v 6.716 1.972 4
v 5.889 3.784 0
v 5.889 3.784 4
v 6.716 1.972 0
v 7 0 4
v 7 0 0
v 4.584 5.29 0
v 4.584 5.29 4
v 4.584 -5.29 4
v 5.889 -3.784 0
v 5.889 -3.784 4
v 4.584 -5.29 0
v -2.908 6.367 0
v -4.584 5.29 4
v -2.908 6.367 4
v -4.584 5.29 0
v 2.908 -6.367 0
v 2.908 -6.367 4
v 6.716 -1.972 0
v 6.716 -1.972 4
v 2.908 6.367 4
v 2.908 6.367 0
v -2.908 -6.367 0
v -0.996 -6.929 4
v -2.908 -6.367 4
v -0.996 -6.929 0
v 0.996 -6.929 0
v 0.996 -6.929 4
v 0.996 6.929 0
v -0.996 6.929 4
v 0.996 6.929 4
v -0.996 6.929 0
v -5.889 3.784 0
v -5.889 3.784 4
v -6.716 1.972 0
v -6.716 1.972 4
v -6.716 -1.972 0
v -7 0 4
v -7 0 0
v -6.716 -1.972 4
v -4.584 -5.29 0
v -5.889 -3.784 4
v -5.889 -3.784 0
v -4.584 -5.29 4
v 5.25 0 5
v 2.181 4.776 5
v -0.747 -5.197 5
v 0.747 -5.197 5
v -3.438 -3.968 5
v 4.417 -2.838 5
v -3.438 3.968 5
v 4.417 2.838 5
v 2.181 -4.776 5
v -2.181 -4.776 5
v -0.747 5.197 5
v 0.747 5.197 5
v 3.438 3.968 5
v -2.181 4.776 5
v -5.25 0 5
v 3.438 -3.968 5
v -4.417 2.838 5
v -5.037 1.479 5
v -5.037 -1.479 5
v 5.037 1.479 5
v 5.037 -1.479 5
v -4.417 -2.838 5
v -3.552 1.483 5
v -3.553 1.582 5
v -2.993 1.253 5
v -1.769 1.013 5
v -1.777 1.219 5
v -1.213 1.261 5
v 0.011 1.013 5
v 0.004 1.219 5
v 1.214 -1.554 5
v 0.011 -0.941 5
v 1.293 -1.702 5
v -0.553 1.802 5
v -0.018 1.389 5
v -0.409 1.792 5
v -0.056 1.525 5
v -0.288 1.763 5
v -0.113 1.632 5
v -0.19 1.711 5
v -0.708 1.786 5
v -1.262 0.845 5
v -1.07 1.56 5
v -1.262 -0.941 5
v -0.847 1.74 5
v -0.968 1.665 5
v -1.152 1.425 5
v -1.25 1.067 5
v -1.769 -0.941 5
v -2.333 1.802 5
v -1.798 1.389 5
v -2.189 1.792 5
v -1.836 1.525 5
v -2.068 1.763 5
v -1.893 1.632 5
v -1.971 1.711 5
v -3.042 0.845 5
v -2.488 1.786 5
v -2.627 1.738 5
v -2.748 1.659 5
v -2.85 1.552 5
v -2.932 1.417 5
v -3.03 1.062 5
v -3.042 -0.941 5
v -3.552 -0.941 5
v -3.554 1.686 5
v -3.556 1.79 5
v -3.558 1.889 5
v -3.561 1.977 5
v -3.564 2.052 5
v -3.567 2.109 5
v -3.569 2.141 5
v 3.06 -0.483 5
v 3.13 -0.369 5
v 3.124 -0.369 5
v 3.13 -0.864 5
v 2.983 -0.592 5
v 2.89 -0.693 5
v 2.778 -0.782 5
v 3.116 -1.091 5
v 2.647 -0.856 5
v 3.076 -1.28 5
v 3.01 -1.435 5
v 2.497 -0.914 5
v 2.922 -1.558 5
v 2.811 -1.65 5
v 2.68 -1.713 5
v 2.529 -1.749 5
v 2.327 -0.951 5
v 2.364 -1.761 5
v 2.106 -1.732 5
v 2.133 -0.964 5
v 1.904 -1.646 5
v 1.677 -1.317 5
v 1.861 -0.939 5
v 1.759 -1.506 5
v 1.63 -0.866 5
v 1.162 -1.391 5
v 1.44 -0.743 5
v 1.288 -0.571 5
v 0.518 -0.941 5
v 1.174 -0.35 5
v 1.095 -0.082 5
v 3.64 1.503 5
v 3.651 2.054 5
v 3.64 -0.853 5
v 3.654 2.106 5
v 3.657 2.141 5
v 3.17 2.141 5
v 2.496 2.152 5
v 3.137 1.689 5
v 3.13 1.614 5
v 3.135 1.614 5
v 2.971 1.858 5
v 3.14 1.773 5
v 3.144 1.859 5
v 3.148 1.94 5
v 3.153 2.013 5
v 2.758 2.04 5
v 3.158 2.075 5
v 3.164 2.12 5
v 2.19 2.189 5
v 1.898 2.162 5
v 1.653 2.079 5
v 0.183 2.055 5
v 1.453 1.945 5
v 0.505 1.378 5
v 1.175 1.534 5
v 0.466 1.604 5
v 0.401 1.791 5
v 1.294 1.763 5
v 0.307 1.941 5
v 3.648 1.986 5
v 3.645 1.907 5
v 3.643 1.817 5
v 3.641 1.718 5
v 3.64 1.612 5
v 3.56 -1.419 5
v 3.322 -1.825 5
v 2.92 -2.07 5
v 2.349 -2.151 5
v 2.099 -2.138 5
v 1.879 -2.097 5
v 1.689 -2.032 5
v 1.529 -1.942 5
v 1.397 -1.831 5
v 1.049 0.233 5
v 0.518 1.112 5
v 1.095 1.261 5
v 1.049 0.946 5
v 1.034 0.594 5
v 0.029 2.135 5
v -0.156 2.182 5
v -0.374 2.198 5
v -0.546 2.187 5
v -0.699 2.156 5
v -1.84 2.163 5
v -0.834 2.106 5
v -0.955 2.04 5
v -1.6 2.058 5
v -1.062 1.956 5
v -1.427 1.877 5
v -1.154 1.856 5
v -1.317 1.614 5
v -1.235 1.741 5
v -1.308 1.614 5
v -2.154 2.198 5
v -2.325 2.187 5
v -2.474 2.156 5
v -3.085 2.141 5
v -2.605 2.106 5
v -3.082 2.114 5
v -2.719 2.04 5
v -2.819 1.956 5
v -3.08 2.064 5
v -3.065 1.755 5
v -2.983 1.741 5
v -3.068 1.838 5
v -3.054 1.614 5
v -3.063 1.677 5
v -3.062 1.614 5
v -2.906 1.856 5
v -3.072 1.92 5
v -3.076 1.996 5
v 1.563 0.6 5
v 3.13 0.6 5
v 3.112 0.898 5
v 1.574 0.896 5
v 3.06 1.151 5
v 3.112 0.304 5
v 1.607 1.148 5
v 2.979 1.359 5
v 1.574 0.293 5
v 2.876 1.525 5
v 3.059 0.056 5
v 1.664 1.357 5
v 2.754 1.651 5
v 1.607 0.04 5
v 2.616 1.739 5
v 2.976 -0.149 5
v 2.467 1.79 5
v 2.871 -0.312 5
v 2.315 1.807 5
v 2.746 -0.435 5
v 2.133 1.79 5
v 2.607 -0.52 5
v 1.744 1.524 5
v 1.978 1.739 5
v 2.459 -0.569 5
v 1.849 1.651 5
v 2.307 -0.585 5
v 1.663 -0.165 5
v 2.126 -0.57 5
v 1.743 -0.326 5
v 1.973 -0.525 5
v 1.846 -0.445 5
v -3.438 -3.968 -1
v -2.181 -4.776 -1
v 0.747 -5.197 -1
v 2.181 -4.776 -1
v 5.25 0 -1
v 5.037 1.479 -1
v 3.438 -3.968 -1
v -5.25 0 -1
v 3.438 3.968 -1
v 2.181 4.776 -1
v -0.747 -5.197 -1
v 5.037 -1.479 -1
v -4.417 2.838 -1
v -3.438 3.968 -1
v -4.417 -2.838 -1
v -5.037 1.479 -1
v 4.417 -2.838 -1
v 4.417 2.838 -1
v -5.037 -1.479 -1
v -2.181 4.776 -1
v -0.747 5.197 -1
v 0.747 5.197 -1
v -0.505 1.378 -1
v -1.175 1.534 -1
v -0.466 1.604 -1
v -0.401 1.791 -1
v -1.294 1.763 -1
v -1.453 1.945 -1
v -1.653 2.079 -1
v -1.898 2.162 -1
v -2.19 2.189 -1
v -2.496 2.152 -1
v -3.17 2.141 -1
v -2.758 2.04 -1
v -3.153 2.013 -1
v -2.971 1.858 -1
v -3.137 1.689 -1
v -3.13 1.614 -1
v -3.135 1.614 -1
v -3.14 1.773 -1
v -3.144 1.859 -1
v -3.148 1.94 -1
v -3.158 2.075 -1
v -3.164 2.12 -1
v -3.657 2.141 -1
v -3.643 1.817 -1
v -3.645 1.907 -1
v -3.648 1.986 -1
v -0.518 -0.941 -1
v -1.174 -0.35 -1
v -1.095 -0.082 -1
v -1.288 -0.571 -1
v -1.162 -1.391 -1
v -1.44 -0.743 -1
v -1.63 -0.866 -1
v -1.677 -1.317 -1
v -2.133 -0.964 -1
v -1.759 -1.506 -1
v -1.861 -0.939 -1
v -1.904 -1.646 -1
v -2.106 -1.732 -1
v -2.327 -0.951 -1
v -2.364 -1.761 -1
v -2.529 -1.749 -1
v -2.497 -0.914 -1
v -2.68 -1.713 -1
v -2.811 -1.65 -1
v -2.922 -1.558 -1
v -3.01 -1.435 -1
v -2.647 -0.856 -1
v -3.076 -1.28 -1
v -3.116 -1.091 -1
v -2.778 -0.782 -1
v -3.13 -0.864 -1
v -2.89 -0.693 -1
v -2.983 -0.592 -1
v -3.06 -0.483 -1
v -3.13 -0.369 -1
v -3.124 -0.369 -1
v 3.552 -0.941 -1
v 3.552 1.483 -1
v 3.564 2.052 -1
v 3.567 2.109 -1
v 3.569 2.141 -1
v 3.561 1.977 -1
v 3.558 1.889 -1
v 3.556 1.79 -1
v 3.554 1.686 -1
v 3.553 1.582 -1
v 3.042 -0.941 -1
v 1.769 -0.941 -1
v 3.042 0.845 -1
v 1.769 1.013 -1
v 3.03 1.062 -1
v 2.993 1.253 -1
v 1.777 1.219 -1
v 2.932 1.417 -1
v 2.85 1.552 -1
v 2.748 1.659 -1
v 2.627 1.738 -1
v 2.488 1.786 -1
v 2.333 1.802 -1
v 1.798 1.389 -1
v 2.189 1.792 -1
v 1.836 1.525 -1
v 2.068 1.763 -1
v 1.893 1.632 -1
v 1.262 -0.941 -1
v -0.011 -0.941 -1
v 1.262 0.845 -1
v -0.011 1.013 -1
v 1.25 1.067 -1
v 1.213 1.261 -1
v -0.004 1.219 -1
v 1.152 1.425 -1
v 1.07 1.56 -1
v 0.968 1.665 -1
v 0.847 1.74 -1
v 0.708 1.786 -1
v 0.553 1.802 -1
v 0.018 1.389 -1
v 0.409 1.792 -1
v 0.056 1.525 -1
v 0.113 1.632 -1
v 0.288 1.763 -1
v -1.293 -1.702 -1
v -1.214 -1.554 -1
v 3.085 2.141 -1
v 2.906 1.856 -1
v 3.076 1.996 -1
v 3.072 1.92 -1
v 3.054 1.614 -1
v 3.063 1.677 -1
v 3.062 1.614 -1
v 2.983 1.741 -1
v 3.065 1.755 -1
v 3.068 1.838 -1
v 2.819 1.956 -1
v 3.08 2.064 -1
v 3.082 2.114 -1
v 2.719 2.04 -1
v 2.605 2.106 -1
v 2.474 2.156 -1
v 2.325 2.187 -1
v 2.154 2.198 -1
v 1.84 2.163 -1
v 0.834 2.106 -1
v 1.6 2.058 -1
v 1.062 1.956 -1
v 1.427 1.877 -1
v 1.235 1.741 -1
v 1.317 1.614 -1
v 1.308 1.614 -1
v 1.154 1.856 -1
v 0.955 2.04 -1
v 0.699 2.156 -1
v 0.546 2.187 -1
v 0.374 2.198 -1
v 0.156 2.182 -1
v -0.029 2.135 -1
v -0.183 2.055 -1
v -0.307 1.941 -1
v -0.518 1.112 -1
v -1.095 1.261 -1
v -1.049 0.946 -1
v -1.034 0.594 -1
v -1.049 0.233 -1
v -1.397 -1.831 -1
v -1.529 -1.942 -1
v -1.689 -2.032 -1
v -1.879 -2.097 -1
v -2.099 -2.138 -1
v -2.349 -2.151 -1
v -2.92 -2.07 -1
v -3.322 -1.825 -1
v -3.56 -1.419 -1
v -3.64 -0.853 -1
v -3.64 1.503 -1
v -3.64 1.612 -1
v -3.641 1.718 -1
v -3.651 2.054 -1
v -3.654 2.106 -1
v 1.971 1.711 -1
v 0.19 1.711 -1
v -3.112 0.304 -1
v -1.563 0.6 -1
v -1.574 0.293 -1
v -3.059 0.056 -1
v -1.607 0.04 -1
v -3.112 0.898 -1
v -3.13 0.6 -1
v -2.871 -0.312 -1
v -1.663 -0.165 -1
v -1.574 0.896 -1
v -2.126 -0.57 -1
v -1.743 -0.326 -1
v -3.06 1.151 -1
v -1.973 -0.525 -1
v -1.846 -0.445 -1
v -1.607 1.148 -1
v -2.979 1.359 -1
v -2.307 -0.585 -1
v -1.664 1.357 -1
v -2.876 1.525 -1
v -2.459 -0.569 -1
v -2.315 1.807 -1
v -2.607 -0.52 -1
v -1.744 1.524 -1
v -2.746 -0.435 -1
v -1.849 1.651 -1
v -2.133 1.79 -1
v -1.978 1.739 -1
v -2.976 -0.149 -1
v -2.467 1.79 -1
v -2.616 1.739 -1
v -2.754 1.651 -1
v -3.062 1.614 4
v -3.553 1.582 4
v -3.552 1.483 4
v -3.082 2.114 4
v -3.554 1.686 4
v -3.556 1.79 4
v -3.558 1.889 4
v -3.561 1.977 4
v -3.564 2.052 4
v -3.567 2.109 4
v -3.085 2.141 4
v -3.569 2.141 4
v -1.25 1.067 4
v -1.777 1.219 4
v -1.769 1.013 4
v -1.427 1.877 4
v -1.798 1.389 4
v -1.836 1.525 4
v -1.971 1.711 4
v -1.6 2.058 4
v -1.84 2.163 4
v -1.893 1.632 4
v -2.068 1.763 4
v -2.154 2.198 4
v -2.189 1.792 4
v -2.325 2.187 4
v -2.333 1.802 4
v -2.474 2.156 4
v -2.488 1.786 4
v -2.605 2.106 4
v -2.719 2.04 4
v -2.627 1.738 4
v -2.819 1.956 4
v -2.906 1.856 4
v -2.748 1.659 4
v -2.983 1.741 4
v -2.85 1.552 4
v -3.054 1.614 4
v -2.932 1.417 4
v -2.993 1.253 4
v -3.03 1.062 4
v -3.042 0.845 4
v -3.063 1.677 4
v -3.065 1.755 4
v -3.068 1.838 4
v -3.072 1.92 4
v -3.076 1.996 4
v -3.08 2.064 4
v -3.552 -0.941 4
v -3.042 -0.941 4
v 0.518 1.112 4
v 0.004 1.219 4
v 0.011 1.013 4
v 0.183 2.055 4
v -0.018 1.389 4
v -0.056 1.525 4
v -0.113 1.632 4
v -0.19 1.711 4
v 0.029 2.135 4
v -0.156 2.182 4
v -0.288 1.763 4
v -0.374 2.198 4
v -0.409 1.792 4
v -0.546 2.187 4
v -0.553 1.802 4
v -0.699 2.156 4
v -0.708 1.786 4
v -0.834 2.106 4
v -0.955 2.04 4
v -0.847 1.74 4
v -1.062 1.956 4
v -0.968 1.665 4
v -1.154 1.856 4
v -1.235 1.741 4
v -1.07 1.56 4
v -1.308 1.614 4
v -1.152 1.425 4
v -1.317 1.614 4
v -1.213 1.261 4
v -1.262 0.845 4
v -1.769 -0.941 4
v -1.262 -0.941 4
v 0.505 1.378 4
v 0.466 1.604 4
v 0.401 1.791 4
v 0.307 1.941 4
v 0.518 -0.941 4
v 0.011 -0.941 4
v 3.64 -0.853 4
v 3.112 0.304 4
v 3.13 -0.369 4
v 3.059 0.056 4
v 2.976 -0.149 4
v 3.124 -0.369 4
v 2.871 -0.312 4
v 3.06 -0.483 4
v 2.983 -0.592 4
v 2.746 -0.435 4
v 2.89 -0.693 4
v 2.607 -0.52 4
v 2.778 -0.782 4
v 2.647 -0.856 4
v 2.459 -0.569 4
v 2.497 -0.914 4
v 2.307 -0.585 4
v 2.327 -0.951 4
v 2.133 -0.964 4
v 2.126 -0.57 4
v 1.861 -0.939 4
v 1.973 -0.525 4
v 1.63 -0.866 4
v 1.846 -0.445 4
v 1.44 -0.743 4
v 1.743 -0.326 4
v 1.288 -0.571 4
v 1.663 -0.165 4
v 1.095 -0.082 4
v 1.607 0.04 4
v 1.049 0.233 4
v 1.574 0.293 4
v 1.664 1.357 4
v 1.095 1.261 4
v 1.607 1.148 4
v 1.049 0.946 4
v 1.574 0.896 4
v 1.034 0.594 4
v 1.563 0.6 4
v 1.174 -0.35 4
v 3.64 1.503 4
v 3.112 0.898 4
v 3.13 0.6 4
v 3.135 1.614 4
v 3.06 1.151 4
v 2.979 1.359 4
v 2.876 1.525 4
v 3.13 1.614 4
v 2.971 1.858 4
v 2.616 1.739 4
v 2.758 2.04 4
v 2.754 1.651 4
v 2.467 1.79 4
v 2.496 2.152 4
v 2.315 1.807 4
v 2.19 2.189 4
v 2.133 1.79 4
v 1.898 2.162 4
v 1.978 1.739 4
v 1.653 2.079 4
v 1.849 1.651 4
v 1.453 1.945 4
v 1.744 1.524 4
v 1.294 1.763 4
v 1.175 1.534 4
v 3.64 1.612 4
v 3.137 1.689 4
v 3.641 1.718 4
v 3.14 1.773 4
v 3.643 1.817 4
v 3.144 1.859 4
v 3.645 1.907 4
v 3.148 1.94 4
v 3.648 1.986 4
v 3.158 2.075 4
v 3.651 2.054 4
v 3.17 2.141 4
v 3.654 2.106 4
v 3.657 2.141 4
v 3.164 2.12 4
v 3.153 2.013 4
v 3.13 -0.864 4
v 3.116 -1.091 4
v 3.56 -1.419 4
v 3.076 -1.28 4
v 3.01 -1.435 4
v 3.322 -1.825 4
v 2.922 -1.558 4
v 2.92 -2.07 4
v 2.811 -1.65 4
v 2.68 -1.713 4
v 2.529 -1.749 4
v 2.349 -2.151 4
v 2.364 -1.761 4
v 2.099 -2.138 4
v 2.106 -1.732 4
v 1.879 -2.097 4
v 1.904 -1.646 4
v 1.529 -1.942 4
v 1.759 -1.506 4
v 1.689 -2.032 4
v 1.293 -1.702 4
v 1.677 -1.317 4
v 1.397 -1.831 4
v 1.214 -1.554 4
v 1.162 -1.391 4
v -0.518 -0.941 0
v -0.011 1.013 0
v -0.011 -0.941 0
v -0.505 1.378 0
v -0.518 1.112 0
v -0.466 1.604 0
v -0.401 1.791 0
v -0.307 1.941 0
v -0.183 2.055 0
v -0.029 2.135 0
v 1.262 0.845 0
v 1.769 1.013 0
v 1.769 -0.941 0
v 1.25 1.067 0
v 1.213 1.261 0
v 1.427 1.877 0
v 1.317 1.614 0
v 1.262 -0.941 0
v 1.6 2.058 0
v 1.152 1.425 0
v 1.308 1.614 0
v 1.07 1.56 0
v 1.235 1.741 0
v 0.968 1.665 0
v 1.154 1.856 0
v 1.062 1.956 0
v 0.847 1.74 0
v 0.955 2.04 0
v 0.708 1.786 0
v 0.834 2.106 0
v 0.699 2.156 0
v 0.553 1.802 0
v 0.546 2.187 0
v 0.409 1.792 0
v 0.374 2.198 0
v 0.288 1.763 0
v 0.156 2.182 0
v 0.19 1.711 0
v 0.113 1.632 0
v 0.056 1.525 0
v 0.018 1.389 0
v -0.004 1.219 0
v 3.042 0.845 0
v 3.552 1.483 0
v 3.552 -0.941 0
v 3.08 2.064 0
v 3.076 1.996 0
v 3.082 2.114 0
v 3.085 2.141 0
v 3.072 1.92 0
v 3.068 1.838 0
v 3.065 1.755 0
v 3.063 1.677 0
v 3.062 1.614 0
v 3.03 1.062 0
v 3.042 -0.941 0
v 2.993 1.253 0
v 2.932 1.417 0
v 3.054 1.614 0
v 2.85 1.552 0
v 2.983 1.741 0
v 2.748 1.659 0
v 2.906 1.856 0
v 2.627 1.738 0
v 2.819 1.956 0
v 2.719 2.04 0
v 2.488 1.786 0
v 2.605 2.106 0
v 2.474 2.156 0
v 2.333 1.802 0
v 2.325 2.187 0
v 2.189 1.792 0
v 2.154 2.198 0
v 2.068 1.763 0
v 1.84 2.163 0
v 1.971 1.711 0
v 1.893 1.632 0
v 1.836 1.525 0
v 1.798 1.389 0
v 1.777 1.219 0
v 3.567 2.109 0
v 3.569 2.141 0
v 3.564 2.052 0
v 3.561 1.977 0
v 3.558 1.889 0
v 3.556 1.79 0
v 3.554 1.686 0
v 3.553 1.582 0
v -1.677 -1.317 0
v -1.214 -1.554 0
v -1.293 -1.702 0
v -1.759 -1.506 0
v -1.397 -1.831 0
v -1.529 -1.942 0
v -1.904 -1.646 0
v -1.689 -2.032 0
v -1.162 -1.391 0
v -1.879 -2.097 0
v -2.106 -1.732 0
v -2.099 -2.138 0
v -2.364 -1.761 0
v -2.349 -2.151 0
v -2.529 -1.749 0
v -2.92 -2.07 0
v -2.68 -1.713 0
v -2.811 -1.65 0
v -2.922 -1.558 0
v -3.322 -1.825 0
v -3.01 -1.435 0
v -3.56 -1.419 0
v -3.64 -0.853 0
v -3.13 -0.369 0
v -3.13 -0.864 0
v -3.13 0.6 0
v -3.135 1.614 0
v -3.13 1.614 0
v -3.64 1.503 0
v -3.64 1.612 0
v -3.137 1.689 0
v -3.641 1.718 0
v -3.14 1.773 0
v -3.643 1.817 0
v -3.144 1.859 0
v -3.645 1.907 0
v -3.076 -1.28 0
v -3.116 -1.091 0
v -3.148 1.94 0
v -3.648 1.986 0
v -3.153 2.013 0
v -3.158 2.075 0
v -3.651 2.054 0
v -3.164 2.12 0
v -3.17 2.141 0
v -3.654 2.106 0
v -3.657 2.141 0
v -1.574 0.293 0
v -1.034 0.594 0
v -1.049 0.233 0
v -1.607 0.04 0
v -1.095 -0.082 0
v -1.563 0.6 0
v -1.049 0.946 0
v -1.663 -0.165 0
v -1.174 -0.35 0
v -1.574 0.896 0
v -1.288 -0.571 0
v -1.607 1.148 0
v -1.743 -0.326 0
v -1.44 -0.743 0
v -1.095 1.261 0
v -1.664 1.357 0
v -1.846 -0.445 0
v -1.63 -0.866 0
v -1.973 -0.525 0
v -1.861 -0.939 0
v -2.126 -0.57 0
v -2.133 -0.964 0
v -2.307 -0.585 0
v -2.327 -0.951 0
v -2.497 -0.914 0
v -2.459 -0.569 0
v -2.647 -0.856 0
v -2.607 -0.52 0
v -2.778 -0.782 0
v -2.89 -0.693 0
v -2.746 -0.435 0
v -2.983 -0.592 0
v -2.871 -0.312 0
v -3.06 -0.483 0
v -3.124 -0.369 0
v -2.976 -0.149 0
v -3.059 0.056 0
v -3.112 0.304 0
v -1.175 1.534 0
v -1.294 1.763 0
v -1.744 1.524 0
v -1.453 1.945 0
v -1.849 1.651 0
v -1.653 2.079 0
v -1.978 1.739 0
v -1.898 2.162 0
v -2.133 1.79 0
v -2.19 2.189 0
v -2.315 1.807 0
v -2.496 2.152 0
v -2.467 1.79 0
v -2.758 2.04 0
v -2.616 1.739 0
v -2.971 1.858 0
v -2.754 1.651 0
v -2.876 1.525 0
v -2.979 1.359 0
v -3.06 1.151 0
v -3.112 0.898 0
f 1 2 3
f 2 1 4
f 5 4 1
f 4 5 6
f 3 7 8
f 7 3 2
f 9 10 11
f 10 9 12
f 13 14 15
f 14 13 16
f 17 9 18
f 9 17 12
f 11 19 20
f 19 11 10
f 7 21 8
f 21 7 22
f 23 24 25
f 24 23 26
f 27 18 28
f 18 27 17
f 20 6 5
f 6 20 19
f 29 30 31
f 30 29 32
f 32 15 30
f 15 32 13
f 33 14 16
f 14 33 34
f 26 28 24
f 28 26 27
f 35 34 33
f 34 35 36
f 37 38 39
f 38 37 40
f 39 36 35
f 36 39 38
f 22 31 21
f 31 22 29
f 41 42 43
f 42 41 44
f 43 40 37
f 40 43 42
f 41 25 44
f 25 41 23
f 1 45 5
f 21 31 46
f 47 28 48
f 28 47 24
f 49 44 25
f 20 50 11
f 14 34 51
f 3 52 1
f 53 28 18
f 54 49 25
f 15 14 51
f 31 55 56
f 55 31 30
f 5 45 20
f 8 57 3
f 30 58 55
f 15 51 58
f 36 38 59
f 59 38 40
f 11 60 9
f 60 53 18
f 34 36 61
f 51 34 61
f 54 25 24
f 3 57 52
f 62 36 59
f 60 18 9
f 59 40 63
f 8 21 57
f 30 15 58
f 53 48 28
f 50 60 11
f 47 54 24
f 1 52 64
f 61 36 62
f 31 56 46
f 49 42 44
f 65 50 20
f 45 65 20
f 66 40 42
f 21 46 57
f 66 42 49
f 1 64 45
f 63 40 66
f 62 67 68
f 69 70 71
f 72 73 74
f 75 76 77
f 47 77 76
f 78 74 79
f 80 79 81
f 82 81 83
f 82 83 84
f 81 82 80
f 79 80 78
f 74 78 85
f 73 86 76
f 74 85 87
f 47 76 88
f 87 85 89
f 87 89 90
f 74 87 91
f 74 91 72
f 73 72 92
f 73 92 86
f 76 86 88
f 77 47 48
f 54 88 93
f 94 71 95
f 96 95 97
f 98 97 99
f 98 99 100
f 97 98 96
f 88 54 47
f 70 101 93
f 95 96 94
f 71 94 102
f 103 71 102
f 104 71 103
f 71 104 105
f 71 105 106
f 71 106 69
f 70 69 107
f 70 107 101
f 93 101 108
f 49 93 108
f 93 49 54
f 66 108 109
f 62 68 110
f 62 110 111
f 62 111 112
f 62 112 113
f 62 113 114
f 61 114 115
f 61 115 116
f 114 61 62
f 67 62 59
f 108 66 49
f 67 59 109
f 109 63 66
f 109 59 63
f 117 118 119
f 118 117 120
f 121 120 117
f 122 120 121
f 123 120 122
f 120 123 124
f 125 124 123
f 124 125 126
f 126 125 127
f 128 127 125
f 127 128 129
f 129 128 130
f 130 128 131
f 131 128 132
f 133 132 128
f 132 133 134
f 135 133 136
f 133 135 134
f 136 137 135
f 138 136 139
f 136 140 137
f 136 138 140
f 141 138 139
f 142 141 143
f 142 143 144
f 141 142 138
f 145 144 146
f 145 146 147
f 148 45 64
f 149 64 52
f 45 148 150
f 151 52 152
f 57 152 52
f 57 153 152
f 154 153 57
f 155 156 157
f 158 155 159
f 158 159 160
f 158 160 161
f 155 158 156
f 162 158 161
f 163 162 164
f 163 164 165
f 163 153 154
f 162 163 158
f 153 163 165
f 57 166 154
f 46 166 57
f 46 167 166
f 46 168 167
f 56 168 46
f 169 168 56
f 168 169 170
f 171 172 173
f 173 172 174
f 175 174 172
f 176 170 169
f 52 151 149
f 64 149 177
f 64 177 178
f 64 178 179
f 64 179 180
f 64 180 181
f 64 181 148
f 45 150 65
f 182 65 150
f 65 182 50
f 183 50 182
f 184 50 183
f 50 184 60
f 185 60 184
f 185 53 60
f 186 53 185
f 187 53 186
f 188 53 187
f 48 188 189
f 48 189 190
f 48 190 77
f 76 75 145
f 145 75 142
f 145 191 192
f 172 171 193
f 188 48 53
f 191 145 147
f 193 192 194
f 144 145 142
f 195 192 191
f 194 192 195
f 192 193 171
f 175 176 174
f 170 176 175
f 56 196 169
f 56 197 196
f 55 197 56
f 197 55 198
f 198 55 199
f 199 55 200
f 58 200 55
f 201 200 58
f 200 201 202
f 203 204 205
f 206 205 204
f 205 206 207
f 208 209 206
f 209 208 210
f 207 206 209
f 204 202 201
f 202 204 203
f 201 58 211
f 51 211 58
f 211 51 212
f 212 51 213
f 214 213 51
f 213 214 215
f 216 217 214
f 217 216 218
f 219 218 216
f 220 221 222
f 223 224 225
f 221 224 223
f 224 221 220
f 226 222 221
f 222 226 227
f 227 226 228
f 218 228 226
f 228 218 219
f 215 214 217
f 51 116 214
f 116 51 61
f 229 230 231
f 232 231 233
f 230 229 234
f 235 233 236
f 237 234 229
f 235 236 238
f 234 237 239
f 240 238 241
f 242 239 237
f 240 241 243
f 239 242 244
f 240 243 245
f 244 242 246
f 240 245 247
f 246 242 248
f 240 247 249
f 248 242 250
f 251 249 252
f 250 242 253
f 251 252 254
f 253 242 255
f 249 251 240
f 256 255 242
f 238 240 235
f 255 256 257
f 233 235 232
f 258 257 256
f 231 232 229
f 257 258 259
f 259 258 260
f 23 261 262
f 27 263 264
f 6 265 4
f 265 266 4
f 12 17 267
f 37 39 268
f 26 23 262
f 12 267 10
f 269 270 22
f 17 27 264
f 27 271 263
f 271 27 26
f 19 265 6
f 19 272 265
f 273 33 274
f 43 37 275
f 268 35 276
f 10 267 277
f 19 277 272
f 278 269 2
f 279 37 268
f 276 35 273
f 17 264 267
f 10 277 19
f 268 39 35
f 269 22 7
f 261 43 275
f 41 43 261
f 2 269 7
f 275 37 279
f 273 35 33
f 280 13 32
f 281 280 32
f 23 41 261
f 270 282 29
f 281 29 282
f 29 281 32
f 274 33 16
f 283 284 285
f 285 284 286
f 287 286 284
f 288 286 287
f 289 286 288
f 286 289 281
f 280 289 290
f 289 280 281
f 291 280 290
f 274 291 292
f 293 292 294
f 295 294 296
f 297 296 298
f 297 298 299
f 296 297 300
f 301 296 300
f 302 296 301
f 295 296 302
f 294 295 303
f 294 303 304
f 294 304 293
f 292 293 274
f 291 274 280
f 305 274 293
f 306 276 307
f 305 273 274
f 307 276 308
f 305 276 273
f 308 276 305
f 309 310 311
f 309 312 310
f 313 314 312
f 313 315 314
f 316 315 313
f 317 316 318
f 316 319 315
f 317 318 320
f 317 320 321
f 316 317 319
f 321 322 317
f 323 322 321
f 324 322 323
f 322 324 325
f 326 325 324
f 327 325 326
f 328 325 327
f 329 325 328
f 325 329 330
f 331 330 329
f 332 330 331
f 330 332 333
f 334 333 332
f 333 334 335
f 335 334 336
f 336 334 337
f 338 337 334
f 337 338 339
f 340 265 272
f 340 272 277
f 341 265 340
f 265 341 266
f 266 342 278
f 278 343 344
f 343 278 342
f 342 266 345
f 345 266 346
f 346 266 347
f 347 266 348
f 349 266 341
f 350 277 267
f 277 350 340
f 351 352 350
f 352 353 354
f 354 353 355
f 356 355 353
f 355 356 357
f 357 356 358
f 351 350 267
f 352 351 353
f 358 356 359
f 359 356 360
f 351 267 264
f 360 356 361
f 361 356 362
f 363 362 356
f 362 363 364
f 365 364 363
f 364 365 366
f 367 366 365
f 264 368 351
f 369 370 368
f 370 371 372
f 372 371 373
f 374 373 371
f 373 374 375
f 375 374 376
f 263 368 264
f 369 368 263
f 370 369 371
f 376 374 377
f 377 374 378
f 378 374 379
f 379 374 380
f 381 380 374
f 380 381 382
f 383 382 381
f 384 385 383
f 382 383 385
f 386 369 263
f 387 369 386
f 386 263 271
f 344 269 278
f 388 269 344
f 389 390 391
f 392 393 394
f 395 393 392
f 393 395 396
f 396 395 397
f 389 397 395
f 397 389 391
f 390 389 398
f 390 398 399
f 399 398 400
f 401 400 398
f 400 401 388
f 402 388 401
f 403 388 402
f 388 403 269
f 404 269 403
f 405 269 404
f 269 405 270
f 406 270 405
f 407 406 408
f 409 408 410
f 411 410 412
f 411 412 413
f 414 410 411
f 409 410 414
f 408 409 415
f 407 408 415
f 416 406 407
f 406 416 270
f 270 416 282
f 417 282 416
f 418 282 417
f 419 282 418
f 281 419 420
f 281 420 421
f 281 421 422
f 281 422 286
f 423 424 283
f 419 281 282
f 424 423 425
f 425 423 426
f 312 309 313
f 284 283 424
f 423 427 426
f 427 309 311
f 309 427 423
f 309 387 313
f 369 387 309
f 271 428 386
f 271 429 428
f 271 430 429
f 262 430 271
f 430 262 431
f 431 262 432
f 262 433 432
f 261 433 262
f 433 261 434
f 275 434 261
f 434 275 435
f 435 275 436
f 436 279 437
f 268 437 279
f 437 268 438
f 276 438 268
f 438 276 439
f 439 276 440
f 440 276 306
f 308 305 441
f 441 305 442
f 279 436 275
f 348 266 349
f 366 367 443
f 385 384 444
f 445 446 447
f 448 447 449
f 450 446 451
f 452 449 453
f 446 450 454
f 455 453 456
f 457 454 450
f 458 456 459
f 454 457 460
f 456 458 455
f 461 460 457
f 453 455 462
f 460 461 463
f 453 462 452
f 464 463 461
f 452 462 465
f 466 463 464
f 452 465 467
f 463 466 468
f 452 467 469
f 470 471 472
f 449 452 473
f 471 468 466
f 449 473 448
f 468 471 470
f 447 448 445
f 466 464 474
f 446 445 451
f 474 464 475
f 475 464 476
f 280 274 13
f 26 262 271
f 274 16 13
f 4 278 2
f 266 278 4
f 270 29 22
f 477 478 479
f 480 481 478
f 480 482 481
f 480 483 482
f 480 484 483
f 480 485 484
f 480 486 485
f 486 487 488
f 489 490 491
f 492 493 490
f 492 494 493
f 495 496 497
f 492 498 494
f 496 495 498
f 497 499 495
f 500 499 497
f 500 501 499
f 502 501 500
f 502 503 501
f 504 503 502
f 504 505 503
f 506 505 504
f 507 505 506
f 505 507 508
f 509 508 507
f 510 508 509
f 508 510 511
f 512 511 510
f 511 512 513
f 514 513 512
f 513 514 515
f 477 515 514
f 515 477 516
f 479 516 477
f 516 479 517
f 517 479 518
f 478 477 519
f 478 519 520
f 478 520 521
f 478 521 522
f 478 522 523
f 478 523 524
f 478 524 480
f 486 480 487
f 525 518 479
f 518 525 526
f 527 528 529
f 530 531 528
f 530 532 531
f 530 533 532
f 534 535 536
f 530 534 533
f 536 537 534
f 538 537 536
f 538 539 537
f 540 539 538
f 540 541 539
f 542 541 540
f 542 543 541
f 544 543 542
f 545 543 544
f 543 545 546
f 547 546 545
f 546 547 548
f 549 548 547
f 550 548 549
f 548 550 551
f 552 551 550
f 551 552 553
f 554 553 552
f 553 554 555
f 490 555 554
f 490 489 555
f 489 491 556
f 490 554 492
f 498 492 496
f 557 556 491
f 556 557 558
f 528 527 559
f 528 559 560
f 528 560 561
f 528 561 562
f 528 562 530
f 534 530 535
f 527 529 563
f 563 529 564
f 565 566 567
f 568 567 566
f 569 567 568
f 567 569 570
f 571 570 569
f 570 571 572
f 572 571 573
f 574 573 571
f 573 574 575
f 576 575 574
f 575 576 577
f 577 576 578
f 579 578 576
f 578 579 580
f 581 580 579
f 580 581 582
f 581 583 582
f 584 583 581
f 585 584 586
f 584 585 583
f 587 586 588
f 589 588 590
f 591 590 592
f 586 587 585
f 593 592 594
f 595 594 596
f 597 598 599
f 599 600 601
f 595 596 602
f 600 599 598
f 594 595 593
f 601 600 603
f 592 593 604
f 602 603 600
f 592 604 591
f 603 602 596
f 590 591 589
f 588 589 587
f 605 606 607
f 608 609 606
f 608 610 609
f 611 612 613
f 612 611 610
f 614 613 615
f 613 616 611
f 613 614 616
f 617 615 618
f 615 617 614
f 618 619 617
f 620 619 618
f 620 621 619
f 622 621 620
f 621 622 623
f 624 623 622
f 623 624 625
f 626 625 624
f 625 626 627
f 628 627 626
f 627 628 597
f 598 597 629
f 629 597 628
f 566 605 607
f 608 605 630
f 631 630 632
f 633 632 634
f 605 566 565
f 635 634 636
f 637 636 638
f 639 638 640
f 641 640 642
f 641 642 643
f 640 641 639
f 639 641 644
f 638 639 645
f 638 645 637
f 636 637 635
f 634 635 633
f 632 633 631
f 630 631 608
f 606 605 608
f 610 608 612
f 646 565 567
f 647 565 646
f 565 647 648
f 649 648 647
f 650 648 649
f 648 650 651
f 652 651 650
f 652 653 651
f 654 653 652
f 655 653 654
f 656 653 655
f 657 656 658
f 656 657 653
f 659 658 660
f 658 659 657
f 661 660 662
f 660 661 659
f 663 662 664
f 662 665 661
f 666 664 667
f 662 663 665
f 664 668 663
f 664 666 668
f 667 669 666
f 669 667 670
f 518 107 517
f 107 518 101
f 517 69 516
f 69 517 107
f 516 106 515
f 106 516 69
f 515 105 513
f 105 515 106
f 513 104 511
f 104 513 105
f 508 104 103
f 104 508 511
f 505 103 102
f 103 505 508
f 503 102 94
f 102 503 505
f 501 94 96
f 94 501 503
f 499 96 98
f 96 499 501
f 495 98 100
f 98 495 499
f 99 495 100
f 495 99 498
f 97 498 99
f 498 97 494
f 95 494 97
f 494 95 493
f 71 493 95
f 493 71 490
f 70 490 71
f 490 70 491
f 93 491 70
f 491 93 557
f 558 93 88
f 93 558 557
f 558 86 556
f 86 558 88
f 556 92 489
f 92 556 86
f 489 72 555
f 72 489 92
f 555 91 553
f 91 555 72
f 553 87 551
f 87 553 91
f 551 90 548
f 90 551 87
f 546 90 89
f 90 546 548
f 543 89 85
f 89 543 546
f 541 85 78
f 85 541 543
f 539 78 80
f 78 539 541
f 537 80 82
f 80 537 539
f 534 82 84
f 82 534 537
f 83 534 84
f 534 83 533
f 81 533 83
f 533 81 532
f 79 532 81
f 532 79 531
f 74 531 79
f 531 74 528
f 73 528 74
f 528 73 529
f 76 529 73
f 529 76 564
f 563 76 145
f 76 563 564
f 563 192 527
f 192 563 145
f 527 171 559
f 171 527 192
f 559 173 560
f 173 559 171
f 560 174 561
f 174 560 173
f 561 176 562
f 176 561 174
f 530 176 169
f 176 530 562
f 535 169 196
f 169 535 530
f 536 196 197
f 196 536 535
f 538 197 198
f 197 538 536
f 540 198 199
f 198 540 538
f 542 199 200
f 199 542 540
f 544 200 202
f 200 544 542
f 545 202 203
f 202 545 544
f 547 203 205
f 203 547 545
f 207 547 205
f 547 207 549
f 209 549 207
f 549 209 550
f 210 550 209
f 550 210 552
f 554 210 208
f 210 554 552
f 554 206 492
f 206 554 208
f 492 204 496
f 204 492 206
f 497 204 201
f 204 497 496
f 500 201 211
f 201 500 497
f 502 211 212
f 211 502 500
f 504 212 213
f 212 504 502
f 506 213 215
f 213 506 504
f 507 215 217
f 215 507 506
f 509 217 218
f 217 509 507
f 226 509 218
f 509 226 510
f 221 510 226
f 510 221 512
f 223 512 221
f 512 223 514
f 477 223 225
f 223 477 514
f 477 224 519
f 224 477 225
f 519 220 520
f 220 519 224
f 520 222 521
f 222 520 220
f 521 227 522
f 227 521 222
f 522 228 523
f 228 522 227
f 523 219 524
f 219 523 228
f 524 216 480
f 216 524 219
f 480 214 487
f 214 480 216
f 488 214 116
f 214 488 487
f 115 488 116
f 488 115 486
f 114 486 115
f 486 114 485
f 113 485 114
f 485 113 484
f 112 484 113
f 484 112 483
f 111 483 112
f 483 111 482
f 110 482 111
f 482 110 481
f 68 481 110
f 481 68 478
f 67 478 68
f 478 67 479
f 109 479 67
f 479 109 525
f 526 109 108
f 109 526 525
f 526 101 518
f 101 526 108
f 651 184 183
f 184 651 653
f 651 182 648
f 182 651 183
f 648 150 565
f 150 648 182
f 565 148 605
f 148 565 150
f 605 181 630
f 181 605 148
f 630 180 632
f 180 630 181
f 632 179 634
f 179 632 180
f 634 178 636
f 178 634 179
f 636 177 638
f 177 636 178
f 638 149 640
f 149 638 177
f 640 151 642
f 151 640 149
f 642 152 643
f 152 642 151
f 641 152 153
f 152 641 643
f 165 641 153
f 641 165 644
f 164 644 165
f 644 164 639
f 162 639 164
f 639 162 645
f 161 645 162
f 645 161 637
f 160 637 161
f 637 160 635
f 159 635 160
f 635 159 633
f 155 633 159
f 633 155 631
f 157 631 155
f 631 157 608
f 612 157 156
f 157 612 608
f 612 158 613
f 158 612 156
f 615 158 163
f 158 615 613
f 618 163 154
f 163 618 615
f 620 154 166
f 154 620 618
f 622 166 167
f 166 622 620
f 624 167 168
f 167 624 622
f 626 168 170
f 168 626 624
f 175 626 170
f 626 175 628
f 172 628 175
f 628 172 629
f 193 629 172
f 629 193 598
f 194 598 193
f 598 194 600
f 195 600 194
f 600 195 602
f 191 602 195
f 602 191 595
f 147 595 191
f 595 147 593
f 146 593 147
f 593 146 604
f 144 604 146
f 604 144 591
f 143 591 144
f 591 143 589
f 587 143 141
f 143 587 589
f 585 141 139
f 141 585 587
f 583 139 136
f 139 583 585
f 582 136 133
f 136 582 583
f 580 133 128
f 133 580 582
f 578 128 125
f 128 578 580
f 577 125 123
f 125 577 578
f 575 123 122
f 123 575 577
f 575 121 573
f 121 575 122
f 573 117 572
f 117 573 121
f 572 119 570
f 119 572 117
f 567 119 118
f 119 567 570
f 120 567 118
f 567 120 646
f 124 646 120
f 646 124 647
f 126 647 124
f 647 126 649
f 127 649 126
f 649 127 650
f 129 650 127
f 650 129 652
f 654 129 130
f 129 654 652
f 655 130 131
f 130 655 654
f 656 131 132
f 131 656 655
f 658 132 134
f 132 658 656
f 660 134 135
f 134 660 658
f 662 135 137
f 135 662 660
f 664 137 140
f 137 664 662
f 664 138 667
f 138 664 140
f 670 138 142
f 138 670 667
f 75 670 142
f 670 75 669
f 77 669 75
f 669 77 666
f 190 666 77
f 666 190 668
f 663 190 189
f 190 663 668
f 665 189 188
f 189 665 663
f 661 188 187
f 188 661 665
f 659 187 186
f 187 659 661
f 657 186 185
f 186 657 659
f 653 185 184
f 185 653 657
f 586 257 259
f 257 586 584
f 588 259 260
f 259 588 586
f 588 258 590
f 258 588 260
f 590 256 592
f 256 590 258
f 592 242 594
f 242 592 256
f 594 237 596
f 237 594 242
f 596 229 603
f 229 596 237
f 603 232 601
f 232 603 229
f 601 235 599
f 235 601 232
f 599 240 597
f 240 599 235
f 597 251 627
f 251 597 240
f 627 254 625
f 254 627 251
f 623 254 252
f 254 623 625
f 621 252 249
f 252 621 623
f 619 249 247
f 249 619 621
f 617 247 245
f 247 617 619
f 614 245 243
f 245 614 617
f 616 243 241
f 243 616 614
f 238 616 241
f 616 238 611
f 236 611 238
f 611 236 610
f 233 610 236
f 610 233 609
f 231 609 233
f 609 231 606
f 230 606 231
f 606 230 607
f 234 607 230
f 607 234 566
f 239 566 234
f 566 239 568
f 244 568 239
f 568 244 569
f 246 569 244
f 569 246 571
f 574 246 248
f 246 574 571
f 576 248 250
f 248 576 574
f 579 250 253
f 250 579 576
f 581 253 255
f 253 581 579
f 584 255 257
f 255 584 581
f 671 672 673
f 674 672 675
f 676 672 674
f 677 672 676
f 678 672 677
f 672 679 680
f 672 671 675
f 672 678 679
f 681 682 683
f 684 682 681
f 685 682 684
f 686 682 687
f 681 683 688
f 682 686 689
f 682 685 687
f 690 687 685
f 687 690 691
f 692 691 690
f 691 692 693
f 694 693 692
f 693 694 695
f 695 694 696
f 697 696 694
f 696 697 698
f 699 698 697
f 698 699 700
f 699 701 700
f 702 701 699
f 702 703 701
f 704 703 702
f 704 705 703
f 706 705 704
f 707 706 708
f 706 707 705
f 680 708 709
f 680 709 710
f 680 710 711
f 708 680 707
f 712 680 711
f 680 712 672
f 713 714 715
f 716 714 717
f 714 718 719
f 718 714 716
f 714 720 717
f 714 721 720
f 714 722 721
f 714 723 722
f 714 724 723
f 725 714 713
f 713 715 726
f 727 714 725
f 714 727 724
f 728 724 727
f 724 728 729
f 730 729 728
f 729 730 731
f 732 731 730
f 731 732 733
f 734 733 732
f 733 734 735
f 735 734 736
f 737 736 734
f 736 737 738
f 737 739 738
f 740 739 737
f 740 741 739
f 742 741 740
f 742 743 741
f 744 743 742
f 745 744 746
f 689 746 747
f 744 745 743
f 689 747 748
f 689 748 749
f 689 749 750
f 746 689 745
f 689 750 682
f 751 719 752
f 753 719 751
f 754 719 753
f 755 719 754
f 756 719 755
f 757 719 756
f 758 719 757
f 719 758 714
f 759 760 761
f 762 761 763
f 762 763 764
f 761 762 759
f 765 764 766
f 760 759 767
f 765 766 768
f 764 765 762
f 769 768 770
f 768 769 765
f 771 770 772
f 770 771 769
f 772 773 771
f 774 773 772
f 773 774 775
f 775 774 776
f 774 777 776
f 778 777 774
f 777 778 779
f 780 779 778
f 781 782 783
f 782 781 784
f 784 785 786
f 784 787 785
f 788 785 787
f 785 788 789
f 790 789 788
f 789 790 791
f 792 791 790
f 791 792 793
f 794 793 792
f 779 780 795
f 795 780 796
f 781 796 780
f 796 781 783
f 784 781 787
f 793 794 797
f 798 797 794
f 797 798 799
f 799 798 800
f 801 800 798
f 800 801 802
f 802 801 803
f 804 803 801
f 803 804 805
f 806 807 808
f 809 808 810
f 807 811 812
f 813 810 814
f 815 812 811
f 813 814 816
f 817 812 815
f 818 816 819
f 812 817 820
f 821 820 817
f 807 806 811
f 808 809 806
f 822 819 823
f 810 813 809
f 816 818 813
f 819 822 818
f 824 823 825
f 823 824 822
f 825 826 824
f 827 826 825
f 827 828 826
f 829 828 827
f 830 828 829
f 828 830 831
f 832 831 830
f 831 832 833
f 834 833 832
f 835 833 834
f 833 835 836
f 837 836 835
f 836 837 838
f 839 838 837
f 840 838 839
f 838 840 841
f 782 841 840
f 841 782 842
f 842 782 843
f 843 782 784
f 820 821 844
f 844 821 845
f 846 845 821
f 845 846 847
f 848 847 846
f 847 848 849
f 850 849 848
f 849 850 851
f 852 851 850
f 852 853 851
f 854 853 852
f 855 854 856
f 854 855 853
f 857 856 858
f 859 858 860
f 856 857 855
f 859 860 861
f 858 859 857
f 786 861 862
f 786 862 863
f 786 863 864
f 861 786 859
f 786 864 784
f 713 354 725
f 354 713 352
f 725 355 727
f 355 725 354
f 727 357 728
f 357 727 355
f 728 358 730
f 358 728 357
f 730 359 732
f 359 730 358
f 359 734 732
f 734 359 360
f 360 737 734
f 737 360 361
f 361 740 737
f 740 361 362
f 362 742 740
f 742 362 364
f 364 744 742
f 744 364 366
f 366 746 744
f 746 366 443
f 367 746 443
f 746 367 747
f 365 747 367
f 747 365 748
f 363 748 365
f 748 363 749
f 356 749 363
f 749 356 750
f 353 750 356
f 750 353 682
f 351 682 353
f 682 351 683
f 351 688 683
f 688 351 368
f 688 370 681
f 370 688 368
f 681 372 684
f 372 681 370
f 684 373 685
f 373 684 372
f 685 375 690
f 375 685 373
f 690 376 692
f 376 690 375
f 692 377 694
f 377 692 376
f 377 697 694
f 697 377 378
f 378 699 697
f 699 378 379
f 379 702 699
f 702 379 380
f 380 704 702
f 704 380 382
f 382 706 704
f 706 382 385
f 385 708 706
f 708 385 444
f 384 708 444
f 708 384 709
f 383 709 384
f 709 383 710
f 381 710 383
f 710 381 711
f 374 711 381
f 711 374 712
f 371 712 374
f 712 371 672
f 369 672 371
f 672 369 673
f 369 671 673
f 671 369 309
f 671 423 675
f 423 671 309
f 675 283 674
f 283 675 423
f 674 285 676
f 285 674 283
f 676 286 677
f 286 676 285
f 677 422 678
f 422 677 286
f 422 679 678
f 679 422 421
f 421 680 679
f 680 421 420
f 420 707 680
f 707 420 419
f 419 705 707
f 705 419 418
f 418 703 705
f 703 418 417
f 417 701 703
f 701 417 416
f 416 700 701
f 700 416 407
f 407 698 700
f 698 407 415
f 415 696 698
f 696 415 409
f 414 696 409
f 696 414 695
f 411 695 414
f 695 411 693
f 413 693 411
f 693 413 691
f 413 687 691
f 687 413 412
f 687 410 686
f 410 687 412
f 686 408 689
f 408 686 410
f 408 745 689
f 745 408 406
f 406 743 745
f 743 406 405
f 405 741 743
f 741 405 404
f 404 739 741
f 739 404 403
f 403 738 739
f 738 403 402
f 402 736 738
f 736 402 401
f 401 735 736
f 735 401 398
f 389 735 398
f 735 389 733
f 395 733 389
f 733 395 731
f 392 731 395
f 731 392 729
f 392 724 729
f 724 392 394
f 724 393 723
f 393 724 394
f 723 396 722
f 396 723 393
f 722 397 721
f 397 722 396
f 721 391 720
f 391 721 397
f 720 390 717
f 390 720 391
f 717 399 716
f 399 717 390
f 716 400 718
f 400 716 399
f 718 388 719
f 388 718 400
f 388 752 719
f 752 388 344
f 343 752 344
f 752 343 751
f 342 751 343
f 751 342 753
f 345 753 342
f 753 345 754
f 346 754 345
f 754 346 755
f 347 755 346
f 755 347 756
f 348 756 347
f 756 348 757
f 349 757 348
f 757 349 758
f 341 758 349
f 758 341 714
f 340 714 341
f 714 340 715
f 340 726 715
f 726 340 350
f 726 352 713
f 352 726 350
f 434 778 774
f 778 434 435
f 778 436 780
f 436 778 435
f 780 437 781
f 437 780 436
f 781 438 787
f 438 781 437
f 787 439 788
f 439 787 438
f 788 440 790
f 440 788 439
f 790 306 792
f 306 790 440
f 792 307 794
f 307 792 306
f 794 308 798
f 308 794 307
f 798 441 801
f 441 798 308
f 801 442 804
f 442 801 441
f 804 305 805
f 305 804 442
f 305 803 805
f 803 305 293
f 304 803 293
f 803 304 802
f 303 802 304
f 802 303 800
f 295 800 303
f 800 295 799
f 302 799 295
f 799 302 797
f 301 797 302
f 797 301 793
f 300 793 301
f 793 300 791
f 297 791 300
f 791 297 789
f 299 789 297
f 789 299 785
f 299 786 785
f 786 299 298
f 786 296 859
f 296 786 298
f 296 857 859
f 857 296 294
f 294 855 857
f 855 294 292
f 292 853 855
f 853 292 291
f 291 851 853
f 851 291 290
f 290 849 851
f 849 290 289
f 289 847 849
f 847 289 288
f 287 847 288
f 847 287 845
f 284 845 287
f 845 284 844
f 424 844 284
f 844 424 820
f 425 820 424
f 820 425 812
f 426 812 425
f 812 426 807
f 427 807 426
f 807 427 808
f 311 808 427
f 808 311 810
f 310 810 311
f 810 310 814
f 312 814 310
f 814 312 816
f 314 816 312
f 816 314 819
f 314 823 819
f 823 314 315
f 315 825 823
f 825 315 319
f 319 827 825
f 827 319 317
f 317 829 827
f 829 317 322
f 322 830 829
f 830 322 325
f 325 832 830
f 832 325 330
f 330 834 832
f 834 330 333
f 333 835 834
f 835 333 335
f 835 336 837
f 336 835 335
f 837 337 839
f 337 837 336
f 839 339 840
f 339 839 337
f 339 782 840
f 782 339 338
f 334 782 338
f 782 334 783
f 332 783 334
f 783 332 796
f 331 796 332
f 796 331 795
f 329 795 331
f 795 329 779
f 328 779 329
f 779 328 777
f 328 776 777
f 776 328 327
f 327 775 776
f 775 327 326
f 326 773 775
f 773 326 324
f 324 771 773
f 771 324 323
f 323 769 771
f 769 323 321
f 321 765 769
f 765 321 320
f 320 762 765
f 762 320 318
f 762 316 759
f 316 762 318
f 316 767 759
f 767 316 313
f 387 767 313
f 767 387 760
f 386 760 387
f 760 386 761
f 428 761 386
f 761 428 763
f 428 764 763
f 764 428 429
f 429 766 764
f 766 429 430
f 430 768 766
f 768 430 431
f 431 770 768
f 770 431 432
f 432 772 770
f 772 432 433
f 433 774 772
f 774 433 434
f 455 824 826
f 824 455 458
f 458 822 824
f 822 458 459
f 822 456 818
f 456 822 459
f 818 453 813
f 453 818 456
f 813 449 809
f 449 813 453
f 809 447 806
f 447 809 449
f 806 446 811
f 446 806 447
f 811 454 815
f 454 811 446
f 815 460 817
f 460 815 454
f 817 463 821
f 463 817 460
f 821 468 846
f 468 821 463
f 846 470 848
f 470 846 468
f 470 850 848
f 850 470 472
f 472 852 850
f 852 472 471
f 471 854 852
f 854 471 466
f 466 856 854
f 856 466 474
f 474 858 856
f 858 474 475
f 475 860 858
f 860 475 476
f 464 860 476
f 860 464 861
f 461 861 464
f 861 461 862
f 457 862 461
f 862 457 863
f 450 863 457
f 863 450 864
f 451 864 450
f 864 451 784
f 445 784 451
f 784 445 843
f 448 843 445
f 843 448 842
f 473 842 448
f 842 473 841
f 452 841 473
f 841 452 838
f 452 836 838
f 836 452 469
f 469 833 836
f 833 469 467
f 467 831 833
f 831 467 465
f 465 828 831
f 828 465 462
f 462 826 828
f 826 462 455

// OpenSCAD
//Dimentions
top_radius = 7;
bottom_radius = 7;
height = 4;
smooth_radius = 5.25;
smooth_height = 3;

//Text
top_text = "mg";
bottom_text = "mg";
text_size = top_radius * .6;
text_height = 1;
top_text_translate = [0, 0, smooth_height + 1];
bottom_text_translate = [0, 0, -smooth_height + 3];
bottom_text_rotate = [0, 180, 0];


difference(){
	union(){
		cylinder(height, top_radius, bottom_radius);
		translate([0, 0, height]){
			cylinder(1, top_radius, smooth_radius);
		}
		translate([0, 0, -1]){
			cylinder(1, smooth_radius, bottom_radius);
		}
	}

	translate(top_text_translate){
		linear_extrude(height=text_height){
			text(top_text, size=text_size, halign="center", valign="center");
		}
	}

	translate(bottom_text_translate){
		rotate(bottom_text_rotate){
			linear_extrude(height=text_height){
				text(top_text, size=text_size, halign="center", valign="center");
			}
		}
	}
}
